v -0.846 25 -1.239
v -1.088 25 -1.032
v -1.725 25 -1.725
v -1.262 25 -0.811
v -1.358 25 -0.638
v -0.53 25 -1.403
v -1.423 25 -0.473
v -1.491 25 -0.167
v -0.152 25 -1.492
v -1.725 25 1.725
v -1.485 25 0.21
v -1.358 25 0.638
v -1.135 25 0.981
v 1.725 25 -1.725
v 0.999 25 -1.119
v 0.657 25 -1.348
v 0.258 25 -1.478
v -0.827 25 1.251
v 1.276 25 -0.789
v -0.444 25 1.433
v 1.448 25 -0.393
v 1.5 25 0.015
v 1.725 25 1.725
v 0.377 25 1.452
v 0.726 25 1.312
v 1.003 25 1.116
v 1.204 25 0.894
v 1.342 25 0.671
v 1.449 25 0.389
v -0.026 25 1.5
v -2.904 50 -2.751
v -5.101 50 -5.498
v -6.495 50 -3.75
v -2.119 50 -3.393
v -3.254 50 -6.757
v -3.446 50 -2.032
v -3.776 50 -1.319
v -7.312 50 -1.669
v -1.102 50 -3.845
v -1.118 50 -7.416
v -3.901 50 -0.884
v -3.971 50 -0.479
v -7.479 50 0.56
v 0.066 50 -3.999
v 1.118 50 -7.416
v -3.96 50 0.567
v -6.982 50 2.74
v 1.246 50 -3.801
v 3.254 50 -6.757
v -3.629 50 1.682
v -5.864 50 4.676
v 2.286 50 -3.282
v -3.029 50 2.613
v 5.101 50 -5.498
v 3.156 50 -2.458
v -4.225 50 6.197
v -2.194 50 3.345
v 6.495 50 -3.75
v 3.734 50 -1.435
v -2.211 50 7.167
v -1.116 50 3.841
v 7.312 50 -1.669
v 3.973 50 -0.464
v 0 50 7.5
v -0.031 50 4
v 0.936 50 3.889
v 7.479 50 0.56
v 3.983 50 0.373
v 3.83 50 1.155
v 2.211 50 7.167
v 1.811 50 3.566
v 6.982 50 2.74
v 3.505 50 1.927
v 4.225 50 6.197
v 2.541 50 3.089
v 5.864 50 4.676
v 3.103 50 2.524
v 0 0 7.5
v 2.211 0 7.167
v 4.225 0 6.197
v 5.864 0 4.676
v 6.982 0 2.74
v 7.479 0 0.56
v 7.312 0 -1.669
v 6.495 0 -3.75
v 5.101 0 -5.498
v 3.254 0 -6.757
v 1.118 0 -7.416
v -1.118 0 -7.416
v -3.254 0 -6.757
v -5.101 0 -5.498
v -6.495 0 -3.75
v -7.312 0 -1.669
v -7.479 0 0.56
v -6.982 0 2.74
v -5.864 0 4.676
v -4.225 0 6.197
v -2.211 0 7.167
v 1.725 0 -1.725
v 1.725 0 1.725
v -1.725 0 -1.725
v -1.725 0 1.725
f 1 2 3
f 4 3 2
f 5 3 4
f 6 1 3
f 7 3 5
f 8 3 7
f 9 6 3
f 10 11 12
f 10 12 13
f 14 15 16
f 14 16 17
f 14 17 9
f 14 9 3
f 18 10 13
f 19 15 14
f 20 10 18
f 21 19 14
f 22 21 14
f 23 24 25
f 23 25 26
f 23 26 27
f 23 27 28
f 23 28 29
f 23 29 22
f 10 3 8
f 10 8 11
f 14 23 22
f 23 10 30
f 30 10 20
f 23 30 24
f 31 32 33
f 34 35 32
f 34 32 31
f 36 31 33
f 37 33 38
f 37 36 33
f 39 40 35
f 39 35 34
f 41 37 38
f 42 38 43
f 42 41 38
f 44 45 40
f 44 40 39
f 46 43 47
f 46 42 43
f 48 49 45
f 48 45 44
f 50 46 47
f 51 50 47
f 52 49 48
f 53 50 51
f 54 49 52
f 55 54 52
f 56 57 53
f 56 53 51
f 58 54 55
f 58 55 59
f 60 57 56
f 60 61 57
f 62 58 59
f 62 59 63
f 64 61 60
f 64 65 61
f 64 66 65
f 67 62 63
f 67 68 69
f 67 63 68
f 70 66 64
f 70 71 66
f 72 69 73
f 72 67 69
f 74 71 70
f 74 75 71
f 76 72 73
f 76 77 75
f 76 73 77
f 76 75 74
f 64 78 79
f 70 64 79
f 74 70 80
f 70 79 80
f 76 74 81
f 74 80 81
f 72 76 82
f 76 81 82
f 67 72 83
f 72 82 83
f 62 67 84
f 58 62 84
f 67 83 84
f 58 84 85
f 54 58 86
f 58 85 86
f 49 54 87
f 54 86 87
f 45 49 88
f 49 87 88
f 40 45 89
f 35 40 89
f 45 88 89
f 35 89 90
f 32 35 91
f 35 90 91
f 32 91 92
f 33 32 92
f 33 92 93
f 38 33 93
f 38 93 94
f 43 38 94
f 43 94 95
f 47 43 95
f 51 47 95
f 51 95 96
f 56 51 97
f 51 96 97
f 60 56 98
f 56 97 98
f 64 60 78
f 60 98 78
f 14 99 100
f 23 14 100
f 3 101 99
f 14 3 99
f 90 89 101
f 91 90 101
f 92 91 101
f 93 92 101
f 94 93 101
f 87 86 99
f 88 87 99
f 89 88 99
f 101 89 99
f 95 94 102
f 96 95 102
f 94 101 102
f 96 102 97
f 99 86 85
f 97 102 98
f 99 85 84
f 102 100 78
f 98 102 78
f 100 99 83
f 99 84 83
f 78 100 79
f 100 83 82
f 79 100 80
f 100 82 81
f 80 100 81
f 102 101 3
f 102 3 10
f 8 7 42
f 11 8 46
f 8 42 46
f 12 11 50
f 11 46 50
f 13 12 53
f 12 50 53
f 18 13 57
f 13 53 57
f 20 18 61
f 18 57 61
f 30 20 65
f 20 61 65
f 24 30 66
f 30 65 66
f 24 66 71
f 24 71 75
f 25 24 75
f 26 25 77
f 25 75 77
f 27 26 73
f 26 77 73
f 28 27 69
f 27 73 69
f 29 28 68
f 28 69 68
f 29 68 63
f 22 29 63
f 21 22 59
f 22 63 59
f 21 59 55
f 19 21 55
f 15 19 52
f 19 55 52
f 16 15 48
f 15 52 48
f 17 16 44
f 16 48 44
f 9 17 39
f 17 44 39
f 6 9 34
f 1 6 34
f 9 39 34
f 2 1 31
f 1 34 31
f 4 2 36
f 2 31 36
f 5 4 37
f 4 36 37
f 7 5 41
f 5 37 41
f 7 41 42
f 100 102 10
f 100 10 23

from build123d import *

# Parameters (mm, degrees)
SKETCH1_R           = 7.5
BOSS_EXTRUDE1_DEPTH = 50
SKETCH3_W           = 3.45
SKETCH3_H           = 3.45
CUT_EXTRUDE2_DEPTH  = 25


with BuildPart() as part:
    # Sketch1 → Boss-Extrude1 (new body)
    with BuildSketch(Plane(origin=(0, 0, 0), x_dir=(1, 0, 0), z_dir=(0, 1, 0))):
        with Locations(Location((0, 0, 0), (0, 0, 270))):
            Circle(SKETCH1_R)
    extrude(amount=BOSS_EXTRUDE1_DEPTH)

    # Sketch3 → Cut-Extrude2 (cut)
    with BuildSketch(Plane.XZ):
        Rectangle(SKETCH3_W, SKETCH3_H)
    extrude(amount=-CUT_EXTRUDE2_DEPTH, mode=Mode.SUBTRACT)

    # Cut-Loft2: read off the stored shape, not the designer's step
    # Cut-Loft2: loft between two sections, ruled curve by curve
    cut_loft2_from = [
        Edge.make_bspline([(-1.423347069, 25, -0.473374188), (-2.370095445, 25, 2.373319949), (0.476598692, 25, 3.320068326), (1.423347069, 25, 0.473374188), (2.370095445, 25, -2.373319949), (-0.476598692, 25, -3.320068326), (-1.423347069, 25, -0.473374188)], [0, 0, 0, 0, 0.5, 0.5, 0.5, 1, 1, 1, 1], 3, [1, 0.333333333, 0.333333333, 1, 0.333333333, 0.333333333, 1]),
    ]
    cut_loft2_to = [
        Edge.make_bspline([(-3.971230311, 50, -0.478883932), (-4.928998175, 50, 7.463576689), (3.013462446, 50, 8.421344553), (3.971230311, 50, 0.478883932), (4.928998175, 50, -7.463576689), (-3.013462446, 50, -8.421344553), (-3.971230311, 50, -0.478883932)], [0, 0, 0, 0, 0.5, 0.5, 0.5, 1, 1, 1, 1], 3, [1, 0.333333333, 0.333333333, 1, 0.333333333, 0.333333333, 1]),
    ]
    cut_loft2 = Solid(Shell([*[Face.make_surface_from_curves(cut_loft2_from[k], cut_loft2_to[k]) for k in range(1)], Face(Wire(cut_loft2_from)), Face(Wire(cut_loft2_to))]))
    add(cut_loft2, mode=Mode.SUBTRACT)


solid = part.part
